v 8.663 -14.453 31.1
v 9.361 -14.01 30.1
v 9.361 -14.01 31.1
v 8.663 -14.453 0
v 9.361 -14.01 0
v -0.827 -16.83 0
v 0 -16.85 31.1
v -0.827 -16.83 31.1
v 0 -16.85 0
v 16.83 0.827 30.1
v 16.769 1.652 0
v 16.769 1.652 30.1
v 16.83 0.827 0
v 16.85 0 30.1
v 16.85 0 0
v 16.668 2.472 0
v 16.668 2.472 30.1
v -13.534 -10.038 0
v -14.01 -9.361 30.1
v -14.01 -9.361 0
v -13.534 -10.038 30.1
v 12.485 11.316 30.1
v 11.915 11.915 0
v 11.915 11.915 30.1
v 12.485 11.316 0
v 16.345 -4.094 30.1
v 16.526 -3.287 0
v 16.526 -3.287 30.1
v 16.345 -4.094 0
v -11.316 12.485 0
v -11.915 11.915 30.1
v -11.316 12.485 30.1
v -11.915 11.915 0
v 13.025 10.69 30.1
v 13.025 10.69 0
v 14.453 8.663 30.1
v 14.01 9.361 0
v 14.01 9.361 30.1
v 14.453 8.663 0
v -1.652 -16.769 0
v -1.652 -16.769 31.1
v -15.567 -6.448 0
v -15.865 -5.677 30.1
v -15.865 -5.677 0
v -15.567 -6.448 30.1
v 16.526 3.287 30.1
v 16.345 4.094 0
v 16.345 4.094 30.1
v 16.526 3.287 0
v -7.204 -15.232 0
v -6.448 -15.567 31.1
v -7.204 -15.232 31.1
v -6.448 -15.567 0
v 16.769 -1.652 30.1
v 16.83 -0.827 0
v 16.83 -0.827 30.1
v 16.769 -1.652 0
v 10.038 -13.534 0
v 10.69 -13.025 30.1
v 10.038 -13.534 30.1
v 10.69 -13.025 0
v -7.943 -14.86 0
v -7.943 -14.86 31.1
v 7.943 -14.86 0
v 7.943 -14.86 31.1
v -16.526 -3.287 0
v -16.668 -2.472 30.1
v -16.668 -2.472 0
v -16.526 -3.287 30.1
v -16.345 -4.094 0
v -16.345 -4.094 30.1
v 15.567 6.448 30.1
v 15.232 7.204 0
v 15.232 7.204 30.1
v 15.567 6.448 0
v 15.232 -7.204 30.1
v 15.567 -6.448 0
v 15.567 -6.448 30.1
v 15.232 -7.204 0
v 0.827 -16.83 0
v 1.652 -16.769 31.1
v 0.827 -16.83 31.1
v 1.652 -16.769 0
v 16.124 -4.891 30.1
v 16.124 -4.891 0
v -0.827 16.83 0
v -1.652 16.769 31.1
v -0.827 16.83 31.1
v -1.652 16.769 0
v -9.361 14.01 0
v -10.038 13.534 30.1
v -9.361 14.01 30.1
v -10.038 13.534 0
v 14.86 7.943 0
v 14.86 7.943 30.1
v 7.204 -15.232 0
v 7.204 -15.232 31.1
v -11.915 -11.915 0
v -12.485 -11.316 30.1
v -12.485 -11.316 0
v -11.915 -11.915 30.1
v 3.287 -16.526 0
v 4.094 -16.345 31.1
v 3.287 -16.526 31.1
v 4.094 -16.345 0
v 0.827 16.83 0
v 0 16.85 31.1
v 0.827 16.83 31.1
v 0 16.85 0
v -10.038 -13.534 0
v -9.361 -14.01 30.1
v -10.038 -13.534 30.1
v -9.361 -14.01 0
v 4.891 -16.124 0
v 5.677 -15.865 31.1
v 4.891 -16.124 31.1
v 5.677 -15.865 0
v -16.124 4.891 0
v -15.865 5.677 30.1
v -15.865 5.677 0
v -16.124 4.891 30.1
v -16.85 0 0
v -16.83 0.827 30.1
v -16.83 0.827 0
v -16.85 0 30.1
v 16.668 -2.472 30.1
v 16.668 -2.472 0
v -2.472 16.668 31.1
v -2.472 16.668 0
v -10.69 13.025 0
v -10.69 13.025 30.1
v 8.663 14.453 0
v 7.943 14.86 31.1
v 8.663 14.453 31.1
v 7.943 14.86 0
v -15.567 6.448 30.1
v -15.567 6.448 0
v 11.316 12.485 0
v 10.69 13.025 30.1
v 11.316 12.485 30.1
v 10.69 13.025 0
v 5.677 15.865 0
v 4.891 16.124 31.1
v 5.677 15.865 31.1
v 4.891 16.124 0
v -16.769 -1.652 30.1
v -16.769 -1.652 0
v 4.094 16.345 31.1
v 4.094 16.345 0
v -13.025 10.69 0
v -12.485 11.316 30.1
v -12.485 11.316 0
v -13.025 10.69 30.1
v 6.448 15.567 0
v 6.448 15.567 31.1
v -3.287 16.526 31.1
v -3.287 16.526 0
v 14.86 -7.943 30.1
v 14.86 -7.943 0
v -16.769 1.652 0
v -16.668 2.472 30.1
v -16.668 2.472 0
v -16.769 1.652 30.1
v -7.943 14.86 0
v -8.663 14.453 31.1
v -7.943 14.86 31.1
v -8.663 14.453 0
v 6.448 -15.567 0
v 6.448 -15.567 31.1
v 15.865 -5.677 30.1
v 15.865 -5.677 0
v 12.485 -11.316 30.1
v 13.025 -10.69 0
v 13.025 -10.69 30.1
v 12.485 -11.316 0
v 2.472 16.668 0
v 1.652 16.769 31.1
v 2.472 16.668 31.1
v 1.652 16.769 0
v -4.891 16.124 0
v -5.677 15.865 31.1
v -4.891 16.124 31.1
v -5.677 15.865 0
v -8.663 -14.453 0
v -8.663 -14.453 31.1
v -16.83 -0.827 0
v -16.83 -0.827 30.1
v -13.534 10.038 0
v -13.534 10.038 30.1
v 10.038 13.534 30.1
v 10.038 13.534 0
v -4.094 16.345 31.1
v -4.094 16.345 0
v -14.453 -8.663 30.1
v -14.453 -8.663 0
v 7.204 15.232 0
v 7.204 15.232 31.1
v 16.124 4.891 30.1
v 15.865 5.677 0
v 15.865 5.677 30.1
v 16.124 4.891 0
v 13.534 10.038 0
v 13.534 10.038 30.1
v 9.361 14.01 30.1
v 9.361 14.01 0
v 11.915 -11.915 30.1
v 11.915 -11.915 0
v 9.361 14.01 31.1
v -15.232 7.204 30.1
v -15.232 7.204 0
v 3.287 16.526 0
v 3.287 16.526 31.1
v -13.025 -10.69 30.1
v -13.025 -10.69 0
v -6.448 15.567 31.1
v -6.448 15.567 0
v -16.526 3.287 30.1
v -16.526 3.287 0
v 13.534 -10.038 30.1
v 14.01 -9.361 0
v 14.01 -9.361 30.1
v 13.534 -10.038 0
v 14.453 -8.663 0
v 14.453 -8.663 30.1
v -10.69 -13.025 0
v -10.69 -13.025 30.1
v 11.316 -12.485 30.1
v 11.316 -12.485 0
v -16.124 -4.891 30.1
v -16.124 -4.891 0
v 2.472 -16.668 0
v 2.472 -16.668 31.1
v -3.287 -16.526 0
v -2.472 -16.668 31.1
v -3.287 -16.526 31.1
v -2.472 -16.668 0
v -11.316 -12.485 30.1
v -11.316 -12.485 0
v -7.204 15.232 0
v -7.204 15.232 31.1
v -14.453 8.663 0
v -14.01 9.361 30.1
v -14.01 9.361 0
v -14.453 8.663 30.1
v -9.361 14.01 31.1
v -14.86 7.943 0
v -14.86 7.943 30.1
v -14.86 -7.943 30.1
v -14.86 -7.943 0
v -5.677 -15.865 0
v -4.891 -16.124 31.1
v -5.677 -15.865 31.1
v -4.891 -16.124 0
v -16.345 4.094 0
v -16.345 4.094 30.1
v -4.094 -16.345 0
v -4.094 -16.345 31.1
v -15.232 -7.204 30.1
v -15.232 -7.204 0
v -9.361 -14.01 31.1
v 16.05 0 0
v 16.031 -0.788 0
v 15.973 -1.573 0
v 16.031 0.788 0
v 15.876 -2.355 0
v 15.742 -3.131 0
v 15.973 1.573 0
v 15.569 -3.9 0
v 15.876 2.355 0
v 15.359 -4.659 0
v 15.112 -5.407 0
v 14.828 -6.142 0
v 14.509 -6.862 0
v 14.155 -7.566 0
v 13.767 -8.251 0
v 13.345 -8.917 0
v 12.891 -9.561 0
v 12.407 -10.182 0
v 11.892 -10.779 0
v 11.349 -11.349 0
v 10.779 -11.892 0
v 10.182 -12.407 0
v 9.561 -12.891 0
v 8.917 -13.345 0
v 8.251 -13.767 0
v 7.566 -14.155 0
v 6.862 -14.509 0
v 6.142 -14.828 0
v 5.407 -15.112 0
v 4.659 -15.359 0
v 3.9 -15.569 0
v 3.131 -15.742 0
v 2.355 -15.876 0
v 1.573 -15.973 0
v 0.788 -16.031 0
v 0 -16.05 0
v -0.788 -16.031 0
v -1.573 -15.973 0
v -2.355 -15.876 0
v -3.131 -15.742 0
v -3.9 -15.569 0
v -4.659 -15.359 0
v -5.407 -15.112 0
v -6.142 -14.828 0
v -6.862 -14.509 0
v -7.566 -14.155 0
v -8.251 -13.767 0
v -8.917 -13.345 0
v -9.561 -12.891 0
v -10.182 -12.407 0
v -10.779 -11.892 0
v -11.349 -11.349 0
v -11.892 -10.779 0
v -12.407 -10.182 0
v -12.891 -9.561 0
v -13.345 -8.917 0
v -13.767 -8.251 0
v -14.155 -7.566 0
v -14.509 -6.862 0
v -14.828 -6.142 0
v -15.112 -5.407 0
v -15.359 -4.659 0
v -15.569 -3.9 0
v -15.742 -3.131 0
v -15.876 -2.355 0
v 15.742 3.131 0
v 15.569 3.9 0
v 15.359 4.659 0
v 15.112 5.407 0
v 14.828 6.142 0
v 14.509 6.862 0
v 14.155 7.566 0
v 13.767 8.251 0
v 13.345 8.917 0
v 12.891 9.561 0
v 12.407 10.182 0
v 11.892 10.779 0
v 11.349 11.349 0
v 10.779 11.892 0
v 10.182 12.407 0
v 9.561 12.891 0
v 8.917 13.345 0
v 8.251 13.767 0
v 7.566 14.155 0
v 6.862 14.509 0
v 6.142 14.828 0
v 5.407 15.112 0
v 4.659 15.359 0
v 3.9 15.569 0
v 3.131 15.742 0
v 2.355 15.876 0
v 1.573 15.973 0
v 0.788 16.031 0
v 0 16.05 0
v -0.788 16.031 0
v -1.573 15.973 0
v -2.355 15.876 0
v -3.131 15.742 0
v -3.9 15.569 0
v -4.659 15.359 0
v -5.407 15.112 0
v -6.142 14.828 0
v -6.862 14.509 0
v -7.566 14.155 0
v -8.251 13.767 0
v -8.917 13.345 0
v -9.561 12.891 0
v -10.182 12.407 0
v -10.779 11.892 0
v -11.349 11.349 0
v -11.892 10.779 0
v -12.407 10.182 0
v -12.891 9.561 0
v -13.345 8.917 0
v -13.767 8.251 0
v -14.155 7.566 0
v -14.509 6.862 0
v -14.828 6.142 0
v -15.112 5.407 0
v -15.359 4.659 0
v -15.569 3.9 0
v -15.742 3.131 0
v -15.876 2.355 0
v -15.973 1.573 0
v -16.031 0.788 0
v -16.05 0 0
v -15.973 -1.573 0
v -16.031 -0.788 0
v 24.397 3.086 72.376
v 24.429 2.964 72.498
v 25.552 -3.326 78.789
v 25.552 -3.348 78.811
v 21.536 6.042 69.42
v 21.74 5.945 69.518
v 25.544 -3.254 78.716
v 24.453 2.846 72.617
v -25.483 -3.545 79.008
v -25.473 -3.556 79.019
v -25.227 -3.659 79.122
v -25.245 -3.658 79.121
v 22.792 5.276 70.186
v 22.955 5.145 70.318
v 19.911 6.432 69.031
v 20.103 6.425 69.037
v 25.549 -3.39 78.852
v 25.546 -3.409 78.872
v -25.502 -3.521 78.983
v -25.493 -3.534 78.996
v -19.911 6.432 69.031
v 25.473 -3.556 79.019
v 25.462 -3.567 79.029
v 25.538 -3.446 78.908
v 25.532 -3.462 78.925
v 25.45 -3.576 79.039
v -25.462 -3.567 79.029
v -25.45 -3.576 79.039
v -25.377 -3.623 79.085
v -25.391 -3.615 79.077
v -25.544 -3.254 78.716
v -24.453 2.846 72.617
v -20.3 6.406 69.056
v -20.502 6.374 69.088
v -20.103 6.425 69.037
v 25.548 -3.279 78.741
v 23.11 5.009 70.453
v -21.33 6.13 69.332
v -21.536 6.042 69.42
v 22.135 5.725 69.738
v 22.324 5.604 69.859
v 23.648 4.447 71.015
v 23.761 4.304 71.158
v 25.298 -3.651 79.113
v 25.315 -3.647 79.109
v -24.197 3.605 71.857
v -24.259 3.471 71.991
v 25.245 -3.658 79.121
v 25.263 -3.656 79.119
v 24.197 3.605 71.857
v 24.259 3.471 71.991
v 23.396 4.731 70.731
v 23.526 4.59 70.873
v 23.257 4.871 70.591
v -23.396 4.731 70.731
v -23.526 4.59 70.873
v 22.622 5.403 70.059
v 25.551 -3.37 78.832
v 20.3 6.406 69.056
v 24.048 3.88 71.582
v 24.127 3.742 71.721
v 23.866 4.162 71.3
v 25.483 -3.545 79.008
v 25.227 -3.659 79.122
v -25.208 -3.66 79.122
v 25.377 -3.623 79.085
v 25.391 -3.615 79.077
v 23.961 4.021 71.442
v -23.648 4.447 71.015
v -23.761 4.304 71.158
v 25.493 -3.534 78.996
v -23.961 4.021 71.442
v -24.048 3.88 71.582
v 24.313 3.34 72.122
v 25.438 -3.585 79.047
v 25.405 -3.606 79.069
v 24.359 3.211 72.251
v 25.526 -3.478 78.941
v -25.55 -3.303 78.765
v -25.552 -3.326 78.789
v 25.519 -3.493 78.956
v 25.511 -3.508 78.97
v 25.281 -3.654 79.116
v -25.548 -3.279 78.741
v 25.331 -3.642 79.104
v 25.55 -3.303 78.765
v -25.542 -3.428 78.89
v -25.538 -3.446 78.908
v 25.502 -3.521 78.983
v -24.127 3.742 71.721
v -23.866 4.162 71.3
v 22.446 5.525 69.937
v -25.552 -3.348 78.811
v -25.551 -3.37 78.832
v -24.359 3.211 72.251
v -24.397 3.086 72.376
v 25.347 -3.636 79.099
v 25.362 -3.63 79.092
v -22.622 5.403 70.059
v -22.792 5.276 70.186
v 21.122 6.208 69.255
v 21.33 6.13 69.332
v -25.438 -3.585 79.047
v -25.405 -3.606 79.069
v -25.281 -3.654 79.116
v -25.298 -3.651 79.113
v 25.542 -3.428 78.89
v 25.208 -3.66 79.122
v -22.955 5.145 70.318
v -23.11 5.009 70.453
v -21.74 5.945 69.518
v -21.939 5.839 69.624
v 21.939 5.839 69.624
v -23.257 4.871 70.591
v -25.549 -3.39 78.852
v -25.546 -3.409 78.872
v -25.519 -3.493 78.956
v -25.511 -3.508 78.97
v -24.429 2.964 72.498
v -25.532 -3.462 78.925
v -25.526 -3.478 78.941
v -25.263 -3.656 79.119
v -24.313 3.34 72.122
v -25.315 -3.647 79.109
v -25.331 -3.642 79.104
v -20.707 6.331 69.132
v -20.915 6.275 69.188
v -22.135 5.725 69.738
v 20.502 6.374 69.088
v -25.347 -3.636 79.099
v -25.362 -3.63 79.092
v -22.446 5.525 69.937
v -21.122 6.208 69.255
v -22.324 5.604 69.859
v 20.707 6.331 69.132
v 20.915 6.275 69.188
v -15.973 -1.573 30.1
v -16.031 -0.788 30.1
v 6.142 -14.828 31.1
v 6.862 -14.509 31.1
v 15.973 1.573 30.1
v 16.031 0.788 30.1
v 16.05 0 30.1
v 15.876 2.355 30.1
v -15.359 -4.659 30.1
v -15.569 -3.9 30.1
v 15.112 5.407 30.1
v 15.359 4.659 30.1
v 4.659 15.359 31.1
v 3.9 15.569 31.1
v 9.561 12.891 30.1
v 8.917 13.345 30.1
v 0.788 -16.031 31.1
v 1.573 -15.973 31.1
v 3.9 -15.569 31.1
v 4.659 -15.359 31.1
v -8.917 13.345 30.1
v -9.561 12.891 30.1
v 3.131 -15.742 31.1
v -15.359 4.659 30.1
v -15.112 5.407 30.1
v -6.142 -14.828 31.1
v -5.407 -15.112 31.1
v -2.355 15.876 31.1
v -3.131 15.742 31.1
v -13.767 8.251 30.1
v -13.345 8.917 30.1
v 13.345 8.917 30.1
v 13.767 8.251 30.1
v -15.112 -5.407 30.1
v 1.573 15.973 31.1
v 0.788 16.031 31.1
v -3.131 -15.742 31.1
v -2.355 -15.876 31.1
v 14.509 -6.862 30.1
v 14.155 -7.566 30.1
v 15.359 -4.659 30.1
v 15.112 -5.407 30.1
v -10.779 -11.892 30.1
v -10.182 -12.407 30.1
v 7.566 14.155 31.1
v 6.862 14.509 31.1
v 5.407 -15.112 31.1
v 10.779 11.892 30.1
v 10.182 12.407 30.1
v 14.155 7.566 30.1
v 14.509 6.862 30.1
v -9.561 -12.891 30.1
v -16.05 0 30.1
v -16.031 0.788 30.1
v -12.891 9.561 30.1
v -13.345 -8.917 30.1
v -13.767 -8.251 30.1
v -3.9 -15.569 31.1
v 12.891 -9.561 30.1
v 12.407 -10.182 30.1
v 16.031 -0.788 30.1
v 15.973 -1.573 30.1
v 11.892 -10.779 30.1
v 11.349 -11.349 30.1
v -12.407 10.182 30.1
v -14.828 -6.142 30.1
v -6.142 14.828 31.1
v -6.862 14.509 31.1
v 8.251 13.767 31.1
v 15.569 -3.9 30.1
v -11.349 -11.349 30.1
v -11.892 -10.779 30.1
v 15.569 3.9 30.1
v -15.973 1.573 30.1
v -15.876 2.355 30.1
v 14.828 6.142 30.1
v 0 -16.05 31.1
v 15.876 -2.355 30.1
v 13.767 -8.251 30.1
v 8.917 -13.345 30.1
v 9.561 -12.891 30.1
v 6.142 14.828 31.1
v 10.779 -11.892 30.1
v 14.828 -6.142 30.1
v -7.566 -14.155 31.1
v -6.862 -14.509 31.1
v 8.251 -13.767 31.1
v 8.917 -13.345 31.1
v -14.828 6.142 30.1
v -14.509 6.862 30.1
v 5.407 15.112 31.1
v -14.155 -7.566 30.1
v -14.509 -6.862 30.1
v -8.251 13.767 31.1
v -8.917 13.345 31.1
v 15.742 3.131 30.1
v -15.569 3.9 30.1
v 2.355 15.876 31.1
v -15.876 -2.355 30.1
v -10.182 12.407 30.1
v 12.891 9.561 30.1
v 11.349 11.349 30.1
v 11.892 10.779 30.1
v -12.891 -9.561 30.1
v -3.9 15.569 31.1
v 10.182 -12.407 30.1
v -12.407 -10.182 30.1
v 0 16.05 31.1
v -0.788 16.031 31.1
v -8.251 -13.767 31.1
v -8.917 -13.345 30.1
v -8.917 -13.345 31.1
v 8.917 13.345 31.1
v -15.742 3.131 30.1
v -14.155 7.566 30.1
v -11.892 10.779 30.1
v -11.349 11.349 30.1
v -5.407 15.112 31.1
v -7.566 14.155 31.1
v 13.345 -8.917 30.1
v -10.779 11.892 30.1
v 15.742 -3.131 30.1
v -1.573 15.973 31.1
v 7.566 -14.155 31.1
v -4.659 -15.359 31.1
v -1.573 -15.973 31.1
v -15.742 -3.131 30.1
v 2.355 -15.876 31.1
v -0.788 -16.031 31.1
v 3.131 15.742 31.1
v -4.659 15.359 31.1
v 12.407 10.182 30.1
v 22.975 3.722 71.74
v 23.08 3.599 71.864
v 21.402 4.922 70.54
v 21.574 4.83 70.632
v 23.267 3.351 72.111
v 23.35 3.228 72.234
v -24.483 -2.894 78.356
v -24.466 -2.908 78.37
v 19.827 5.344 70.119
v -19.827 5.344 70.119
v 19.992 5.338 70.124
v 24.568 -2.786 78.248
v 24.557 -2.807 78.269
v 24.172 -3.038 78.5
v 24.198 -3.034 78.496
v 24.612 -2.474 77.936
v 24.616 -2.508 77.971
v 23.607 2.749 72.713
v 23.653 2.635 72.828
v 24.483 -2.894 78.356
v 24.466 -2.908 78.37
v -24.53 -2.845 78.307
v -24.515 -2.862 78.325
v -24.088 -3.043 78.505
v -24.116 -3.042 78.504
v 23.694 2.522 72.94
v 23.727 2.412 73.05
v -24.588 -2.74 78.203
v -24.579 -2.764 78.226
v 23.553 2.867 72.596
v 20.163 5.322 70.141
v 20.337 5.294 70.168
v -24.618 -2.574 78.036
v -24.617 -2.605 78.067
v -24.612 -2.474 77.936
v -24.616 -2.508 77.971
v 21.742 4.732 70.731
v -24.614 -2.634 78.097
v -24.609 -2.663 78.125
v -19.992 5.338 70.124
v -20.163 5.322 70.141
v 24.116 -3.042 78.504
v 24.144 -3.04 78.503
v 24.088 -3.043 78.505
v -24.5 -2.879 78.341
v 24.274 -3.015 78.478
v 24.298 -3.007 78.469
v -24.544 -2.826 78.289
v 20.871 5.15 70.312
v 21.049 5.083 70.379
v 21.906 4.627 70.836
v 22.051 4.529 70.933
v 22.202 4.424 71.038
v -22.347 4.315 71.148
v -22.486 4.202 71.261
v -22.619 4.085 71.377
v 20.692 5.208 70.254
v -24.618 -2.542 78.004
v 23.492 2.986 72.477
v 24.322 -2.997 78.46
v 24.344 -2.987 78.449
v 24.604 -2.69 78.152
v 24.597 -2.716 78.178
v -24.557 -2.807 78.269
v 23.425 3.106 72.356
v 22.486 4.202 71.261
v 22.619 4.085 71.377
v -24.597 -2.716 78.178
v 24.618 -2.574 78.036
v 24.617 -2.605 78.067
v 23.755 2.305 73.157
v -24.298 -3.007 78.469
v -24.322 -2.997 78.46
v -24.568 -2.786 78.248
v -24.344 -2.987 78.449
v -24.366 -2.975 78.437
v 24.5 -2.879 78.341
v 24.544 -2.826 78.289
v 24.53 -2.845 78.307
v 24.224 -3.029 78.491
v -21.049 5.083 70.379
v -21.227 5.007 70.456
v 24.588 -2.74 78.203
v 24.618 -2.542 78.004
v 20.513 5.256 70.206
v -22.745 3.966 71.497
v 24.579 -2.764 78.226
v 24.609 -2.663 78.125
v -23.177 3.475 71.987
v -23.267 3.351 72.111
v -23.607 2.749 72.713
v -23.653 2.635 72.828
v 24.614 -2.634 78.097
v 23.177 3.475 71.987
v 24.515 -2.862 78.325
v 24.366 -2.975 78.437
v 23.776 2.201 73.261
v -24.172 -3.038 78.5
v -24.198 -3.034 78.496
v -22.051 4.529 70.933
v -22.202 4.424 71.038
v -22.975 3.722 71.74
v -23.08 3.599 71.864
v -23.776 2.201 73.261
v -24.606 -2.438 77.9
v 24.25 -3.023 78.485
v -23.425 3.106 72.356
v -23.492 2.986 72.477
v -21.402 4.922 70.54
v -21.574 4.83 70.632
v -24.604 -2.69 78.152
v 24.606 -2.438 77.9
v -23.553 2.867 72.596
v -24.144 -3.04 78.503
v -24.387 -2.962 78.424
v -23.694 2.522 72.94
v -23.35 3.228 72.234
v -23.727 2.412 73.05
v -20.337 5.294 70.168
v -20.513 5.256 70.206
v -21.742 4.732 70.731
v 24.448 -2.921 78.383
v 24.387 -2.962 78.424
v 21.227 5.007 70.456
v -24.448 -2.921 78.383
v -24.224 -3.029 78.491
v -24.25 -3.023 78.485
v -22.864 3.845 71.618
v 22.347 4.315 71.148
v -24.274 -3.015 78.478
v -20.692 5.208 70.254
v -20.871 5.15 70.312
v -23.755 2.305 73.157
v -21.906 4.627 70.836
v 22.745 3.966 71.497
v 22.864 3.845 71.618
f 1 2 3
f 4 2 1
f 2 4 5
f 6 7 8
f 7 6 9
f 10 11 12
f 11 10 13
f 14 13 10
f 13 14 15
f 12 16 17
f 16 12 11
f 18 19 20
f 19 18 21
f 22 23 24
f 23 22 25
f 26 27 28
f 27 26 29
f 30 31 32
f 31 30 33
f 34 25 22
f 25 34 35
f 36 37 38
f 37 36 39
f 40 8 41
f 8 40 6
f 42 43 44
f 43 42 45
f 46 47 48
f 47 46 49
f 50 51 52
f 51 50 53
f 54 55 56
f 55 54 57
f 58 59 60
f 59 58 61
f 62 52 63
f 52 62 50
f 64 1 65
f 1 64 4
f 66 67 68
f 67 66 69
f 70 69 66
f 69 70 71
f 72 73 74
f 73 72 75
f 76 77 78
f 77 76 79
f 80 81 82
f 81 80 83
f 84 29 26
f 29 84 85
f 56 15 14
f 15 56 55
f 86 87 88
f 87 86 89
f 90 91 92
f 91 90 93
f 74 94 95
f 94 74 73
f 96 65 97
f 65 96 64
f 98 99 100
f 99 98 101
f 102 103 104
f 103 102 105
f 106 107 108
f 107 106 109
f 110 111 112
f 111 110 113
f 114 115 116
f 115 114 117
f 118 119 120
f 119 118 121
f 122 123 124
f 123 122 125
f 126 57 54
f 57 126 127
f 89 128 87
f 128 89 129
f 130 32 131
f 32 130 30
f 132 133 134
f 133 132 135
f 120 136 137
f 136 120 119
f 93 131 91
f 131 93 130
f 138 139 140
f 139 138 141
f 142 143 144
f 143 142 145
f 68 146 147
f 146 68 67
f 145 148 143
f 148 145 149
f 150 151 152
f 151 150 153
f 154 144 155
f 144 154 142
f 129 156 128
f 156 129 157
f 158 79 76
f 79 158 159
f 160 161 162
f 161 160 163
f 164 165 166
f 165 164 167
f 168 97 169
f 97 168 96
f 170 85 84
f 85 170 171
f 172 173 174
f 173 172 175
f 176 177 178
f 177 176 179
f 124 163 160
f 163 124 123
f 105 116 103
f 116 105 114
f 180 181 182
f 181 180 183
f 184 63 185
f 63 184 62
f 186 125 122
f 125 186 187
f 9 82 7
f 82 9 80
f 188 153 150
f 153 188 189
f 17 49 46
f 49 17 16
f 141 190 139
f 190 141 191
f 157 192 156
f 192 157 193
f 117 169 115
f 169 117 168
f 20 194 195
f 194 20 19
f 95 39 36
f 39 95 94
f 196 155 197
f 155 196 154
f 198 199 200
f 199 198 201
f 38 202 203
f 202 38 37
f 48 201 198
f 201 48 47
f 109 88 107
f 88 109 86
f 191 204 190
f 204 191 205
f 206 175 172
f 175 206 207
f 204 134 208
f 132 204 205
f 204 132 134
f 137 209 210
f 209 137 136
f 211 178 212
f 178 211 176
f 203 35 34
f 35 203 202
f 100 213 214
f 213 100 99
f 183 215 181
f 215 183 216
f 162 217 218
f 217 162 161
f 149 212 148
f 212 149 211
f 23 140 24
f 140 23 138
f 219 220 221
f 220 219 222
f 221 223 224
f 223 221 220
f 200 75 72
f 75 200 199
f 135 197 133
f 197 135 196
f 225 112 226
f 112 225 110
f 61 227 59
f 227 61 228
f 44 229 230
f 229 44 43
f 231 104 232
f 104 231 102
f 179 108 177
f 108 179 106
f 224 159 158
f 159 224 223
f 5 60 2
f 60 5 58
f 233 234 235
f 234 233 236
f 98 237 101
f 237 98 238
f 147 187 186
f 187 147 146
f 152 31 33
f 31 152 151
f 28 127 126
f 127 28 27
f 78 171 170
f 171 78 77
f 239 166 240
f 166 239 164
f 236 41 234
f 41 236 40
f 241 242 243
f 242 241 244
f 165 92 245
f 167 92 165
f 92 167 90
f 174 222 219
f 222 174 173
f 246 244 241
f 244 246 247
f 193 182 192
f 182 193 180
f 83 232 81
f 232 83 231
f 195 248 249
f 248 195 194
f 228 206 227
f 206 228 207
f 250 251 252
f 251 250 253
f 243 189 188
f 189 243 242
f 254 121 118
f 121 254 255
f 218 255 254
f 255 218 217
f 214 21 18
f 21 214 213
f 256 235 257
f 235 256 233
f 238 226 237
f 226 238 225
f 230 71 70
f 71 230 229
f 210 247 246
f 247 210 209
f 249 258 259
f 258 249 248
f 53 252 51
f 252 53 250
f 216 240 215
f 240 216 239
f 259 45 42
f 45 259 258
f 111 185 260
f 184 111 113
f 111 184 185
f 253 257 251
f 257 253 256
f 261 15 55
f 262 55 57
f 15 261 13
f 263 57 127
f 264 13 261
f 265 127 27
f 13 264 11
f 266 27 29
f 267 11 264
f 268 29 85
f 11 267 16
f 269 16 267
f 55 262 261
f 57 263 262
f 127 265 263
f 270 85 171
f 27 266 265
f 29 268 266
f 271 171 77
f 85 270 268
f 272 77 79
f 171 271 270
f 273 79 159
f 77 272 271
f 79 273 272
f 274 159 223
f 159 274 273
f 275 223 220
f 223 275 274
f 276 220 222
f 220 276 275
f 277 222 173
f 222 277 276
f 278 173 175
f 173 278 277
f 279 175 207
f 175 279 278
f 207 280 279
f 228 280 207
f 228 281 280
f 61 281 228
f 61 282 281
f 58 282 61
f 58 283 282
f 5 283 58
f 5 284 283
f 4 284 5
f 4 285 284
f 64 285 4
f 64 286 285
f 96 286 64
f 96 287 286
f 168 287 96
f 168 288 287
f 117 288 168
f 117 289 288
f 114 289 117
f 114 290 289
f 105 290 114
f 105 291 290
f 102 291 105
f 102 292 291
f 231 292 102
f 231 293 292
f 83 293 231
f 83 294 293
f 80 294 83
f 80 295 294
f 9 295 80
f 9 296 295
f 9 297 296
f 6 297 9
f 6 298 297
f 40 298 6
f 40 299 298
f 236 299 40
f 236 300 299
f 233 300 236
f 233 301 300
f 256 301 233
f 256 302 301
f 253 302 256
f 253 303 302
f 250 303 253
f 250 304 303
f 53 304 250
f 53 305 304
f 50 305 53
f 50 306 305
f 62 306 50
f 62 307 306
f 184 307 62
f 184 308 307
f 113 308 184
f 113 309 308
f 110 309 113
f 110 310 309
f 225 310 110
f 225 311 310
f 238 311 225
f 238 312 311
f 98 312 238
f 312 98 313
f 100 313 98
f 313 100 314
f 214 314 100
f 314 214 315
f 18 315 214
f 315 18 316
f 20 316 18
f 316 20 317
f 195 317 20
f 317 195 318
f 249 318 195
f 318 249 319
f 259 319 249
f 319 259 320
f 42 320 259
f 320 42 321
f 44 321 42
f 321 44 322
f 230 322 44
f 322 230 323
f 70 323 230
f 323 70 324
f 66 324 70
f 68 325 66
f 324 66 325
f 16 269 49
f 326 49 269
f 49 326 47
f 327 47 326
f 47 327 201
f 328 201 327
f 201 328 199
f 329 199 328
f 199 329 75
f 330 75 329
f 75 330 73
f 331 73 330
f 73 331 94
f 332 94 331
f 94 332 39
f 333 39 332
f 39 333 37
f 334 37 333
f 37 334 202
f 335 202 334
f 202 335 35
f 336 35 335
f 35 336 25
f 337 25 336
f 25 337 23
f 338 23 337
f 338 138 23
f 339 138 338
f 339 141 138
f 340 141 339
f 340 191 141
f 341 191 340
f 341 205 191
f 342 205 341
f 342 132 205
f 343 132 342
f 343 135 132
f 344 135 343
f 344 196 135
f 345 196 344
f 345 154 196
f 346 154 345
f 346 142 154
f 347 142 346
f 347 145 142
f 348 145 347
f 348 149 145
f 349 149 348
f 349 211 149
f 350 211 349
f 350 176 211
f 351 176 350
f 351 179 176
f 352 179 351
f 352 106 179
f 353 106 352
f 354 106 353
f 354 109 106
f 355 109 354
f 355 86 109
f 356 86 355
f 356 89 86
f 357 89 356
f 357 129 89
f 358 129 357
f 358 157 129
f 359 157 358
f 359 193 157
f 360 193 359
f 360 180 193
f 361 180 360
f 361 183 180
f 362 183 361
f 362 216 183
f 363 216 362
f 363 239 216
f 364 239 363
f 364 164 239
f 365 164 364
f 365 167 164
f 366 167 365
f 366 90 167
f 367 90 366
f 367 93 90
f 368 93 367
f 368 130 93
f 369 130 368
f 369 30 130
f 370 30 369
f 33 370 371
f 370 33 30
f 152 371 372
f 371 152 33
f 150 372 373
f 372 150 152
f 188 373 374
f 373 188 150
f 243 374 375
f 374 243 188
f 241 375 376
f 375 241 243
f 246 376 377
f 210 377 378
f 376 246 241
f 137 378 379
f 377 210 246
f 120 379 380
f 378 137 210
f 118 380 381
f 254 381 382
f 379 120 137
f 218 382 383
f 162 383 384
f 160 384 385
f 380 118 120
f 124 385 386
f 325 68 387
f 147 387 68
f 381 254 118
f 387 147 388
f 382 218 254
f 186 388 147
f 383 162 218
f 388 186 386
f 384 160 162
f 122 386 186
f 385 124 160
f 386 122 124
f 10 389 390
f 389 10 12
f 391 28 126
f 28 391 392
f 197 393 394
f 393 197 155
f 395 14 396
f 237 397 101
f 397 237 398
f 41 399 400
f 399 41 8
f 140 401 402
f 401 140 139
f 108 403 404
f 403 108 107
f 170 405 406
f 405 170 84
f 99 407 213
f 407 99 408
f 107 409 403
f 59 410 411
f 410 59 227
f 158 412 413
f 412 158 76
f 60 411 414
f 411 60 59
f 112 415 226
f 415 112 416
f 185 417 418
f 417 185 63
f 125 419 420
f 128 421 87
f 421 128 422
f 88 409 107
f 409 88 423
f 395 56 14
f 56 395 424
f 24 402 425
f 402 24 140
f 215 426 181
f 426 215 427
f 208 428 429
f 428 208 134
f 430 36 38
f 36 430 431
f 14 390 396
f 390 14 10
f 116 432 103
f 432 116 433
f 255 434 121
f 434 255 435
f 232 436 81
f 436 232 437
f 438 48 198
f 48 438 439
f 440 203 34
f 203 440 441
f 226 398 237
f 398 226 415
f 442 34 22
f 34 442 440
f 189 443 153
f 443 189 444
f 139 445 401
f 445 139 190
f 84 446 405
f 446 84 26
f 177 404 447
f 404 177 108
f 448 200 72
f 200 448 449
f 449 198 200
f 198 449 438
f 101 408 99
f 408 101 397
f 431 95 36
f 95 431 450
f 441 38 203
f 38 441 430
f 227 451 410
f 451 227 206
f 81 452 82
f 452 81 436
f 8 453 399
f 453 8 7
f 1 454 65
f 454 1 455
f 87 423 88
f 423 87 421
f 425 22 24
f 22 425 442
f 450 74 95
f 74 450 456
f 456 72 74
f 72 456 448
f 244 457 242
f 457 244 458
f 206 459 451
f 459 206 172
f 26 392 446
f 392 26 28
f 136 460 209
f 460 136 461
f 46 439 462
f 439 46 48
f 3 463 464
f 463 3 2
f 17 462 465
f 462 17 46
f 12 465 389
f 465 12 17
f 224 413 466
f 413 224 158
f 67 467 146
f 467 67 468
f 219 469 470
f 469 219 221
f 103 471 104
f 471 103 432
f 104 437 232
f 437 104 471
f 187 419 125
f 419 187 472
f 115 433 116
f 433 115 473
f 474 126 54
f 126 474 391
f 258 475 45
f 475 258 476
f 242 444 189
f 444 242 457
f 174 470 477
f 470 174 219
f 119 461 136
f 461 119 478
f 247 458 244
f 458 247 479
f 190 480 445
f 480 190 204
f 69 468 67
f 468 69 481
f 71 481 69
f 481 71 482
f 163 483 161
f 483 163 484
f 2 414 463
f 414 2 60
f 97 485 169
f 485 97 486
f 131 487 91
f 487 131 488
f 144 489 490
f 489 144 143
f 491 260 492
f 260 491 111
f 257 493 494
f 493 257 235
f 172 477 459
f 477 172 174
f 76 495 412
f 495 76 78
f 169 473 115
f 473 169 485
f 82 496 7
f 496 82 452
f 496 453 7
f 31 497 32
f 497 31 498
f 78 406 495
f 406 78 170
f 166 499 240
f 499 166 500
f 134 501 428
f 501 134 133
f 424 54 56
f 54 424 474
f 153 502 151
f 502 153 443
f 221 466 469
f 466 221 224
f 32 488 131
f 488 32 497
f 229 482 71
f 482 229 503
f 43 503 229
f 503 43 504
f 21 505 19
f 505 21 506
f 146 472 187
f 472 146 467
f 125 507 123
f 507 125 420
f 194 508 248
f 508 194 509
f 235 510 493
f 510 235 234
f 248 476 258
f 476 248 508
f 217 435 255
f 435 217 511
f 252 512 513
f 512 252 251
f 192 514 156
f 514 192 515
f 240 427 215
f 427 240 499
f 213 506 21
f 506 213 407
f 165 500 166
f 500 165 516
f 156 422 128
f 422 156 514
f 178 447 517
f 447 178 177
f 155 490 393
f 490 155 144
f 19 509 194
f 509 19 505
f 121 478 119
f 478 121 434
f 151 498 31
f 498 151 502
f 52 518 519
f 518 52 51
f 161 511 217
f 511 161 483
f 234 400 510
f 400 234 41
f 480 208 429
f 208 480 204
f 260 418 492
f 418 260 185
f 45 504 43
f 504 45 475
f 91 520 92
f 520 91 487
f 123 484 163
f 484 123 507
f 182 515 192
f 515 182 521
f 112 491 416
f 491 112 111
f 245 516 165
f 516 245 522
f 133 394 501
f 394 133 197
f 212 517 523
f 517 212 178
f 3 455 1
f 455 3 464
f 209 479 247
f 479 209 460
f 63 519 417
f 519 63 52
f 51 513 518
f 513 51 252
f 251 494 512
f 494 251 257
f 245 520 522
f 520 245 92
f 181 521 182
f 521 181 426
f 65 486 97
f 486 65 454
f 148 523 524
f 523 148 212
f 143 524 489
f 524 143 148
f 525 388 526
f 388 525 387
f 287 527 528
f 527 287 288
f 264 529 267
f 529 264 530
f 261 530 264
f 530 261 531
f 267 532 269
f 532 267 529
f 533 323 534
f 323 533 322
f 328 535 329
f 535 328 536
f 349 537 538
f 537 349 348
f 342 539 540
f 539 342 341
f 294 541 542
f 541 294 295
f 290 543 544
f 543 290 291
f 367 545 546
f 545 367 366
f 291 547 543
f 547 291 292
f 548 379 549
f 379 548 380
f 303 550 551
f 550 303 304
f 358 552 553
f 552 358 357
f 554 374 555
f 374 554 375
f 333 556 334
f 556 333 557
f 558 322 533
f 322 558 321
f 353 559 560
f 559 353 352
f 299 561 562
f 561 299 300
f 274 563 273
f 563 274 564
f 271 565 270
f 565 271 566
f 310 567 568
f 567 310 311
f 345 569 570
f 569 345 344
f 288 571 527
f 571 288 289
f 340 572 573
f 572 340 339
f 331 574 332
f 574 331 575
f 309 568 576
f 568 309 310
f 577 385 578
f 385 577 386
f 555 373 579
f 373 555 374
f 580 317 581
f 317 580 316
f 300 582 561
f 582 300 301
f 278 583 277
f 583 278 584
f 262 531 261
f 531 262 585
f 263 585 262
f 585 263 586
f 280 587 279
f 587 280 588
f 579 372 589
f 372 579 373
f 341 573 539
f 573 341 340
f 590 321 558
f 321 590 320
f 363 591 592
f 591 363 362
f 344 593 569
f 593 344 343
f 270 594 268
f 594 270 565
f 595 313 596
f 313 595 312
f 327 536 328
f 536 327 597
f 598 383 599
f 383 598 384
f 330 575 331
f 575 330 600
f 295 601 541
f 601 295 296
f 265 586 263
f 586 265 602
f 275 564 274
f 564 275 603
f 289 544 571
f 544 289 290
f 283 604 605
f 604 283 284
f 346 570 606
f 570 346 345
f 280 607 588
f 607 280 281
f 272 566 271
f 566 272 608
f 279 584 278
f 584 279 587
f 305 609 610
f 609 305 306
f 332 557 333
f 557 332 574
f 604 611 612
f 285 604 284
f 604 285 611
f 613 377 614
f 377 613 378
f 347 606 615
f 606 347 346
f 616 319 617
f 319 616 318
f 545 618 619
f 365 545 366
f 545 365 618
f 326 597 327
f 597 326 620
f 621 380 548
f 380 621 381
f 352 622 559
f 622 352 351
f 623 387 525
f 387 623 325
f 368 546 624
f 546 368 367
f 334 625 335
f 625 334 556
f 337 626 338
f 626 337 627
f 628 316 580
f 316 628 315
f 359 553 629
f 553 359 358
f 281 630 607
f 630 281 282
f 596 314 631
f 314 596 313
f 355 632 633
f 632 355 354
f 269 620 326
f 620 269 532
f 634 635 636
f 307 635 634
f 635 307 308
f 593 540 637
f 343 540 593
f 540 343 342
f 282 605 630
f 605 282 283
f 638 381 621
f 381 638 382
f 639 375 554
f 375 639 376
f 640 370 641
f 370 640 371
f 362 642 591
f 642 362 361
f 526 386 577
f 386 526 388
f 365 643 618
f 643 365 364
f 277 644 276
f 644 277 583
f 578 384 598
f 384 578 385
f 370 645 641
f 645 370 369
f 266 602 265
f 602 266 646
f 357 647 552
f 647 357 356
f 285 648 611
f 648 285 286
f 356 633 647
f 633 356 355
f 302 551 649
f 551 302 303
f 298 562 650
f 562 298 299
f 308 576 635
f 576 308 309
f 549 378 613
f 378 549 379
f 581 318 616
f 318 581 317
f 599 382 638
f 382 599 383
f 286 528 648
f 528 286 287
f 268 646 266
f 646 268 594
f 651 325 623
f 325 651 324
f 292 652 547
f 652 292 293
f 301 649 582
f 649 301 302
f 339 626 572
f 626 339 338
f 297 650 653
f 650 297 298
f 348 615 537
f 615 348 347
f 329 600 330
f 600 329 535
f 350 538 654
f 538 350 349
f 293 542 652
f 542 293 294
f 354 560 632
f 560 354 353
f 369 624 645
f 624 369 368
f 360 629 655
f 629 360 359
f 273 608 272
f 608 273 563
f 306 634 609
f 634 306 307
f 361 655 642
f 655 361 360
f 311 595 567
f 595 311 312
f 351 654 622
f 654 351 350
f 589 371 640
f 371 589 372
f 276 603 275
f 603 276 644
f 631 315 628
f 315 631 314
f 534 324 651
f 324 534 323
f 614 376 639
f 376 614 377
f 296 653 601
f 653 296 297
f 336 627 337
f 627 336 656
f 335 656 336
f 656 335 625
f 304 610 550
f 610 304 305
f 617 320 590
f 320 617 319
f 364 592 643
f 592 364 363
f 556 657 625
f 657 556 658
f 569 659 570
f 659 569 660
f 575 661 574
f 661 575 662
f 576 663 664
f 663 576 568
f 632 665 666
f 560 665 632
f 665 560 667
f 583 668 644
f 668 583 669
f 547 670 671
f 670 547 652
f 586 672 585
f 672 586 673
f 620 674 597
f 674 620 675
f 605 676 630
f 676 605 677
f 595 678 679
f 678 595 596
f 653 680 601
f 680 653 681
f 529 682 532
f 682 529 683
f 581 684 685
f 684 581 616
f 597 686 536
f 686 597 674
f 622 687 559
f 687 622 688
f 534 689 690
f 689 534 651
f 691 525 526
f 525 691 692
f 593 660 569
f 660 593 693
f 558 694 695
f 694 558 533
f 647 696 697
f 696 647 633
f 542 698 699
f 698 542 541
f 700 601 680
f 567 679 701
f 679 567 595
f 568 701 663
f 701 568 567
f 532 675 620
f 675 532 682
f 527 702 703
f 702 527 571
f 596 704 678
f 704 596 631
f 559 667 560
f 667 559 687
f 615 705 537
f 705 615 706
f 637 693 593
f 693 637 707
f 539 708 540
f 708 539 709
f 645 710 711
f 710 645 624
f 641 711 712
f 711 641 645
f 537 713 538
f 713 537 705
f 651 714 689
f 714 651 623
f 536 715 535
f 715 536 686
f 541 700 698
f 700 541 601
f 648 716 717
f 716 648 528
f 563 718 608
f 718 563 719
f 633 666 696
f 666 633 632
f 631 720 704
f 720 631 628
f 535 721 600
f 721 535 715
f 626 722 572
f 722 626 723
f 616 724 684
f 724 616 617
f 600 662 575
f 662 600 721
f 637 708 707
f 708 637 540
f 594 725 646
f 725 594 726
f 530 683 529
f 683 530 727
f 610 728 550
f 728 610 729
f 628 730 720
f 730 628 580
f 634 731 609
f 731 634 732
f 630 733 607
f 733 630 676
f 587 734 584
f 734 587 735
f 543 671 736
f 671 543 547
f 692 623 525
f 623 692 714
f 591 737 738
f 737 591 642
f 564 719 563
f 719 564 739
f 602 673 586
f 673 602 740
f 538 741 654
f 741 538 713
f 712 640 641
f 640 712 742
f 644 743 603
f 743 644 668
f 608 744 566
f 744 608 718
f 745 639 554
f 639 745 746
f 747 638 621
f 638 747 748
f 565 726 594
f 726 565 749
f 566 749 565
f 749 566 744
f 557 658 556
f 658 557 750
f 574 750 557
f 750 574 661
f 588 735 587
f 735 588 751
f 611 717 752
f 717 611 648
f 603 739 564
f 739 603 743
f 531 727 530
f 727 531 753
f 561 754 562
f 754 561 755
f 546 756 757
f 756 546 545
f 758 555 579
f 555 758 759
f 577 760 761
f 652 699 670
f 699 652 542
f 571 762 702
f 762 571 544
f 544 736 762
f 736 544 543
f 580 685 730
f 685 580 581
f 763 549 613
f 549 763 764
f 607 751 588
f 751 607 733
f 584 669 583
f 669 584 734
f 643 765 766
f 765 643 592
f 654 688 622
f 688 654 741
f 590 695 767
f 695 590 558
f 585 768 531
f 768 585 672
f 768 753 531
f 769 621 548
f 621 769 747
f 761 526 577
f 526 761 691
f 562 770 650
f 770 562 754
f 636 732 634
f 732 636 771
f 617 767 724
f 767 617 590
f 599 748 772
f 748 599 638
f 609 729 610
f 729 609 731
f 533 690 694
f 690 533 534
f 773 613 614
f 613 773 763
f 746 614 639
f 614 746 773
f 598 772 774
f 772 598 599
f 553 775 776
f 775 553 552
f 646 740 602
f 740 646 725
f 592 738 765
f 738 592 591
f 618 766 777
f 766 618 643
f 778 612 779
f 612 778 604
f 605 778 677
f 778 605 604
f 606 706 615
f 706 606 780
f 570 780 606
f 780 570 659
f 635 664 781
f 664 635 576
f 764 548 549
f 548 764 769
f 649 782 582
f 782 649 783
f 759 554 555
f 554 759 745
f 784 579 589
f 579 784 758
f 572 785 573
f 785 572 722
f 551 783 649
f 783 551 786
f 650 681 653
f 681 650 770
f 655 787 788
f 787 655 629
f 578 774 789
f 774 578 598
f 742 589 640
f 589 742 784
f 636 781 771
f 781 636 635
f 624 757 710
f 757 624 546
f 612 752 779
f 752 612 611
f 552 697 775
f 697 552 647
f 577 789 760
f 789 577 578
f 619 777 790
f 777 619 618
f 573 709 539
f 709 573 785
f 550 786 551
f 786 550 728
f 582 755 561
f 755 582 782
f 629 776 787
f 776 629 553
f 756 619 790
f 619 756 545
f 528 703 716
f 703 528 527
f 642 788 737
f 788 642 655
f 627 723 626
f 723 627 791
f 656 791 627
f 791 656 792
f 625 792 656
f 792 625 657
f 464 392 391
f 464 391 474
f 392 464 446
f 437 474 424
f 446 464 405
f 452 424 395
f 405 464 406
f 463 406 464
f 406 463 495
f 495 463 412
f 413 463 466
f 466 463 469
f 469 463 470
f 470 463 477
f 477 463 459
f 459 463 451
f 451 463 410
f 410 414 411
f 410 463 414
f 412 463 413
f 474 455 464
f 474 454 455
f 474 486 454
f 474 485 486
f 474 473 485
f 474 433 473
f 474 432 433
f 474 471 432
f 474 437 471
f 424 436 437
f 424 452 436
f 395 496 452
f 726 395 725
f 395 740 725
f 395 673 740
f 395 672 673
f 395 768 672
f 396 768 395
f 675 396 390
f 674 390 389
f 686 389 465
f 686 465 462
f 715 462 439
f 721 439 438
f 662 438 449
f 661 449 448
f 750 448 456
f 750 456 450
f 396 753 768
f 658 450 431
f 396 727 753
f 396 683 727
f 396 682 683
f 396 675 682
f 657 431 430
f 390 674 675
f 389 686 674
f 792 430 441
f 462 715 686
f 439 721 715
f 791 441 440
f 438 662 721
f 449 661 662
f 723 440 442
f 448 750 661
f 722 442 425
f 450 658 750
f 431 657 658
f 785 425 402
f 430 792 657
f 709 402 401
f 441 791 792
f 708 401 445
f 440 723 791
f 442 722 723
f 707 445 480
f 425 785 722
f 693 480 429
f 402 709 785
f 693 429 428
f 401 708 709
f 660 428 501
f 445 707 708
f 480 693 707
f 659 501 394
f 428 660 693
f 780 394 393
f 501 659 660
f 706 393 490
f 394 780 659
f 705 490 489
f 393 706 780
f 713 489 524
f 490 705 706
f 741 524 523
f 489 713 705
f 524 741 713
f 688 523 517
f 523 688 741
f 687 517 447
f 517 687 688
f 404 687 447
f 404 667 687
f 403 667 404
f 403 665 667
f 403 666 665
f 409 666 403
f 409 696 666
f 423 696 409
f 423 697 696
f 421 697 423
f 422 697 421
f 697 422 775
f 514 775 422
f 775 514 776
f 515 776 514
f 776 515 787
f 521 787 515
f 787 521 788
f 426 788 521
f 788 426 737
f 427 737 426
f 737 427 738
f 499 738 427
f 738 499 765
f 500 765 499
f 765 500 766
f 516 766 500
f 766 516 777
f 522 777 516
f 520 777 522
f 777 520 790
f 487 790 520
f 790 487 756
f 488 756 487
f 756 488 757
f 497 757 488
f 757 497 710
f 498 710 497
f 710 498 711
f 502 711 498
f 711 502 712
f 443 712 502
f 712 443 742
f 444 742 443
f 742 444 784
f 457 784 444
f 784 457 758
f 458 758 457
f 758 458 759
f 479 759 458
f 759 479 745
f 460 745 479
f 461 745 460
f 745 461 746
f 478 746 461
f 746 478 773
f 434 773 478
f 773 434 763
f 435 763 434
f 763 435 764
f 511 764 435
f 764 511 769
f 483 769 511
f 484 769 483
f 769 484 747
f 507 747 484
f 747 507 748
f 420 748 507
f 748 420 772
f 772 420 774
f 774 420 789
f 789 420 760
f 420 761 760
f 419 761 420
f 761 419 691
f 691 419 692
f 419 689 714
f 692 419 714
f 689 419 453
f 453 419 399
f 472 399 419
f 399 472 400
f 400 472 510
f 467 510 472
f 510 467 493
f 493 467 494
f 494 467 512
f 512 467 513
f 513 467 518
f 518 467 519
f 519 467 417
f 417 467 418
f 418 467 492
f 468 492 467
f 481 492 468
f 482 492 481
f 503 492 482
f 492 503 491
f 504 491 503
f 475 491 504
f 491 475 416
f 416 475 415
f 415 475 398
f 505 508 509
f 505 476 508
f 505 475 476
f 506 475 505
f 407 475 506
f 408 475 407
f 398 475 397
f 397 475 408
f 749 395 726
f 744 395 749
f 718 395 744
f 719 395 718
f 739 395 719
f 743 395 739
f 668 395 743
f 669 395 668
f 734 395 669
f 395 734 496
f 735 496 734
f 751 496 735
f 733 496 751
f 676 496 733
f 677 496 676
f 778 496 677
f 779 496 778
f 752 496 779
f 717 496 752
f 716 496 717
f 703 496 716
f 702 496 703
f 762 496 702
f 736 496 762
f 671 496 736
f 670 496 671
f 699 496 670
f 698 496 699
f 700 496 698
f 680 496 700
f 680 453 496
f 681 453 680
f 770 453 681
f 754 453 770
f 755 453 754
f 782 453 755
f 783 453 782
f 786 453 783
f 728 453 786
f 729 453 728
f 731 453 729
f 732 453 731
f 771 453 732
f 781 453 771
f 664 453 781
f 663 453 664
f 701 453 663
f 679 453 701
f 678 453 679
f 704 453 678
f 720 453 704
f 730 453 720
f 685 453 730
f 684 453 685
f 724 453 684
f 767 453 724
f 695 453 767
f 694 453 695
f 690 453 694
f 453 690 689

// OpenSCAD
// Parametrische Staubsauger-Aufsätze (OpenSCAD)
// Autor: Atrox3D
// Version: 1.0
// Lizenz: MIT
// Datum: 03.09.2025
// Beschreibung: Generator für Adapter, Fugendüsen, Flachdüsen und Bürstenaufsätze.
// Alle Maße sind parametrisierbar.

//Scaling
$fn = $preview ? 64 : 128;

/* [Düsentyp] */
//Was soll erzeugt werden? Moegliche Werte: "adapter", "fugen_duese", "flach_duese"
aufsatz_typ = "flach_duese";

//Global Params

/* [adapter] */
adapter_inlet_start_diameter = 32.1;
adapter_outlet_end_diameter = 25.1;
adapter_start_length = 30.1;
adapter_end_length = 30.1;
adapter_wall_thickness = 1.6;

/* [fugen_duese] */
fugenD_inlet_start_diameter = 32.1;
fugenD_outlet_end_diameter = 15.1;
fugenD_start_length = 30.1;
fugenD_end_length = 30.1;
fugenD_wall_thickness = 1.6;
fugenD_end_angle = 0.0;

/* [flach_duese] */
flachD_inlet_start_diameter = 32.1;
flachD_outlet_end_diameter = 5.1;
flachD_start_length = 30.1;
flachD_end_length = 50.1;
flachD_wall_thickness = 1.6;
flachD_end_angle = 45;
flachD_breite = 50;

/* [Hidden] */
tiny_epsilon = 0.01;
cut_margin   = 0.1;

if (aufsatz_typ == "adapter")
    adapter(adapter_inlet_start_diameter, adapter_outlet_end_diameter, adapter_start_length,adapter_end_length, adapter_wall_thickness);


else if (aufsatz_typ == "fugen_duese")
    fugen_duese(fugenD_inlet_start_diameter, fugenD_start_length, fugenD_outlet_end_diameter, fugenD_end_length, fugenD_wall_thickness, fugenD_end_angle);


else if (aufsatz_typ == "flach_duese")
    flach_duese(flachD_inlet_start_diameter, flachD_start_length, flachD_end_length, flachD_wall_thickness, flachD_outlet_end_diameter, flachD_breite, flachD_end_angle);


//Vormodule
module adapter_base(d_in_s, d_out_e, l_s,l_e, w){
    union(){
        cylinder(h=l_s, d=d_in_s);
        translate([0,0,l_s-tiny_epsilon]) cylinder(h=d_in_s-d_out_e,d1=d_in_s,d2=d_out_e);
        translate([0,0,l_s-cut_margin]) cylinder(h=l_e+cut_margin, d=d_out_e);
        }
}

module fugen_duese_base(d_in_s, l_s, d_out_e, l_e, w, e_a){
    difference(){
        union(){
            cylinder(h=l_s, d=d_in_s);
            translate([0,0,l_s-tiny_epsilon]) cylinder(d1=d_in_s,d2=d_out_e,h=l_e);
            }
        }
}

//Endmodule
module adapter(d_in_s, d_out_e, l_s,l_e, w){
    difference(){
        adapter_base(d_in_s+2*w, d_out_e, l_s,l_e, w);
        translate([0,0,-cut_margin-w]) adapter_base(d_in_s, d_out_e-2*w, l_s,l_e+20);
    }
}

module fugen_duese(d_in_s, l_s, d_out_e, l_e, w, e_a){
    difference(){
        fugen_duese_base(d_in_s+w*2, l_s, d_out_e+w*2, l_e, w, e_a);
        translate([0,0,-cut_margin])fugen_duese_base(d_in_s, l_s, d_out_e, l_e+0.2, w, e_a);
        translate([0,0,l_s+l_e+10-e_a/10]) rotate([0,e_a,0]) cube([100,50,20],center =true);
        }
}

module flach_duese(d_in_s, l_s, l_e, w, b, l3, a){
        difference(){            
        union(){
            cylinder(h=l_s,d=d_in_s+w);
            hull(){
                translate([0,0,l_s])cylinder(h=1,d=d_in_s+w);
                translate([0,0,l_s+l_e]) cube([l3+w,b+w,cut_margin ],center=true);
            }
        }
        union(){
            translate([0,0,-cut_margin ]) cylinder(h=l_s+0.2,d=d_in_s);
            hull(){
                translate([0,0,l_s])cylinder(h=1,d=d_in_s);
                translate([0,0,l_s+l_e]) cube([l3,b,0.2],center=true);
                }
            }
            translate([0,0,l_s+l_e]) rotate([a,0,0]) cube([l3+w+1,b+w,200],center=true);
        }
}
